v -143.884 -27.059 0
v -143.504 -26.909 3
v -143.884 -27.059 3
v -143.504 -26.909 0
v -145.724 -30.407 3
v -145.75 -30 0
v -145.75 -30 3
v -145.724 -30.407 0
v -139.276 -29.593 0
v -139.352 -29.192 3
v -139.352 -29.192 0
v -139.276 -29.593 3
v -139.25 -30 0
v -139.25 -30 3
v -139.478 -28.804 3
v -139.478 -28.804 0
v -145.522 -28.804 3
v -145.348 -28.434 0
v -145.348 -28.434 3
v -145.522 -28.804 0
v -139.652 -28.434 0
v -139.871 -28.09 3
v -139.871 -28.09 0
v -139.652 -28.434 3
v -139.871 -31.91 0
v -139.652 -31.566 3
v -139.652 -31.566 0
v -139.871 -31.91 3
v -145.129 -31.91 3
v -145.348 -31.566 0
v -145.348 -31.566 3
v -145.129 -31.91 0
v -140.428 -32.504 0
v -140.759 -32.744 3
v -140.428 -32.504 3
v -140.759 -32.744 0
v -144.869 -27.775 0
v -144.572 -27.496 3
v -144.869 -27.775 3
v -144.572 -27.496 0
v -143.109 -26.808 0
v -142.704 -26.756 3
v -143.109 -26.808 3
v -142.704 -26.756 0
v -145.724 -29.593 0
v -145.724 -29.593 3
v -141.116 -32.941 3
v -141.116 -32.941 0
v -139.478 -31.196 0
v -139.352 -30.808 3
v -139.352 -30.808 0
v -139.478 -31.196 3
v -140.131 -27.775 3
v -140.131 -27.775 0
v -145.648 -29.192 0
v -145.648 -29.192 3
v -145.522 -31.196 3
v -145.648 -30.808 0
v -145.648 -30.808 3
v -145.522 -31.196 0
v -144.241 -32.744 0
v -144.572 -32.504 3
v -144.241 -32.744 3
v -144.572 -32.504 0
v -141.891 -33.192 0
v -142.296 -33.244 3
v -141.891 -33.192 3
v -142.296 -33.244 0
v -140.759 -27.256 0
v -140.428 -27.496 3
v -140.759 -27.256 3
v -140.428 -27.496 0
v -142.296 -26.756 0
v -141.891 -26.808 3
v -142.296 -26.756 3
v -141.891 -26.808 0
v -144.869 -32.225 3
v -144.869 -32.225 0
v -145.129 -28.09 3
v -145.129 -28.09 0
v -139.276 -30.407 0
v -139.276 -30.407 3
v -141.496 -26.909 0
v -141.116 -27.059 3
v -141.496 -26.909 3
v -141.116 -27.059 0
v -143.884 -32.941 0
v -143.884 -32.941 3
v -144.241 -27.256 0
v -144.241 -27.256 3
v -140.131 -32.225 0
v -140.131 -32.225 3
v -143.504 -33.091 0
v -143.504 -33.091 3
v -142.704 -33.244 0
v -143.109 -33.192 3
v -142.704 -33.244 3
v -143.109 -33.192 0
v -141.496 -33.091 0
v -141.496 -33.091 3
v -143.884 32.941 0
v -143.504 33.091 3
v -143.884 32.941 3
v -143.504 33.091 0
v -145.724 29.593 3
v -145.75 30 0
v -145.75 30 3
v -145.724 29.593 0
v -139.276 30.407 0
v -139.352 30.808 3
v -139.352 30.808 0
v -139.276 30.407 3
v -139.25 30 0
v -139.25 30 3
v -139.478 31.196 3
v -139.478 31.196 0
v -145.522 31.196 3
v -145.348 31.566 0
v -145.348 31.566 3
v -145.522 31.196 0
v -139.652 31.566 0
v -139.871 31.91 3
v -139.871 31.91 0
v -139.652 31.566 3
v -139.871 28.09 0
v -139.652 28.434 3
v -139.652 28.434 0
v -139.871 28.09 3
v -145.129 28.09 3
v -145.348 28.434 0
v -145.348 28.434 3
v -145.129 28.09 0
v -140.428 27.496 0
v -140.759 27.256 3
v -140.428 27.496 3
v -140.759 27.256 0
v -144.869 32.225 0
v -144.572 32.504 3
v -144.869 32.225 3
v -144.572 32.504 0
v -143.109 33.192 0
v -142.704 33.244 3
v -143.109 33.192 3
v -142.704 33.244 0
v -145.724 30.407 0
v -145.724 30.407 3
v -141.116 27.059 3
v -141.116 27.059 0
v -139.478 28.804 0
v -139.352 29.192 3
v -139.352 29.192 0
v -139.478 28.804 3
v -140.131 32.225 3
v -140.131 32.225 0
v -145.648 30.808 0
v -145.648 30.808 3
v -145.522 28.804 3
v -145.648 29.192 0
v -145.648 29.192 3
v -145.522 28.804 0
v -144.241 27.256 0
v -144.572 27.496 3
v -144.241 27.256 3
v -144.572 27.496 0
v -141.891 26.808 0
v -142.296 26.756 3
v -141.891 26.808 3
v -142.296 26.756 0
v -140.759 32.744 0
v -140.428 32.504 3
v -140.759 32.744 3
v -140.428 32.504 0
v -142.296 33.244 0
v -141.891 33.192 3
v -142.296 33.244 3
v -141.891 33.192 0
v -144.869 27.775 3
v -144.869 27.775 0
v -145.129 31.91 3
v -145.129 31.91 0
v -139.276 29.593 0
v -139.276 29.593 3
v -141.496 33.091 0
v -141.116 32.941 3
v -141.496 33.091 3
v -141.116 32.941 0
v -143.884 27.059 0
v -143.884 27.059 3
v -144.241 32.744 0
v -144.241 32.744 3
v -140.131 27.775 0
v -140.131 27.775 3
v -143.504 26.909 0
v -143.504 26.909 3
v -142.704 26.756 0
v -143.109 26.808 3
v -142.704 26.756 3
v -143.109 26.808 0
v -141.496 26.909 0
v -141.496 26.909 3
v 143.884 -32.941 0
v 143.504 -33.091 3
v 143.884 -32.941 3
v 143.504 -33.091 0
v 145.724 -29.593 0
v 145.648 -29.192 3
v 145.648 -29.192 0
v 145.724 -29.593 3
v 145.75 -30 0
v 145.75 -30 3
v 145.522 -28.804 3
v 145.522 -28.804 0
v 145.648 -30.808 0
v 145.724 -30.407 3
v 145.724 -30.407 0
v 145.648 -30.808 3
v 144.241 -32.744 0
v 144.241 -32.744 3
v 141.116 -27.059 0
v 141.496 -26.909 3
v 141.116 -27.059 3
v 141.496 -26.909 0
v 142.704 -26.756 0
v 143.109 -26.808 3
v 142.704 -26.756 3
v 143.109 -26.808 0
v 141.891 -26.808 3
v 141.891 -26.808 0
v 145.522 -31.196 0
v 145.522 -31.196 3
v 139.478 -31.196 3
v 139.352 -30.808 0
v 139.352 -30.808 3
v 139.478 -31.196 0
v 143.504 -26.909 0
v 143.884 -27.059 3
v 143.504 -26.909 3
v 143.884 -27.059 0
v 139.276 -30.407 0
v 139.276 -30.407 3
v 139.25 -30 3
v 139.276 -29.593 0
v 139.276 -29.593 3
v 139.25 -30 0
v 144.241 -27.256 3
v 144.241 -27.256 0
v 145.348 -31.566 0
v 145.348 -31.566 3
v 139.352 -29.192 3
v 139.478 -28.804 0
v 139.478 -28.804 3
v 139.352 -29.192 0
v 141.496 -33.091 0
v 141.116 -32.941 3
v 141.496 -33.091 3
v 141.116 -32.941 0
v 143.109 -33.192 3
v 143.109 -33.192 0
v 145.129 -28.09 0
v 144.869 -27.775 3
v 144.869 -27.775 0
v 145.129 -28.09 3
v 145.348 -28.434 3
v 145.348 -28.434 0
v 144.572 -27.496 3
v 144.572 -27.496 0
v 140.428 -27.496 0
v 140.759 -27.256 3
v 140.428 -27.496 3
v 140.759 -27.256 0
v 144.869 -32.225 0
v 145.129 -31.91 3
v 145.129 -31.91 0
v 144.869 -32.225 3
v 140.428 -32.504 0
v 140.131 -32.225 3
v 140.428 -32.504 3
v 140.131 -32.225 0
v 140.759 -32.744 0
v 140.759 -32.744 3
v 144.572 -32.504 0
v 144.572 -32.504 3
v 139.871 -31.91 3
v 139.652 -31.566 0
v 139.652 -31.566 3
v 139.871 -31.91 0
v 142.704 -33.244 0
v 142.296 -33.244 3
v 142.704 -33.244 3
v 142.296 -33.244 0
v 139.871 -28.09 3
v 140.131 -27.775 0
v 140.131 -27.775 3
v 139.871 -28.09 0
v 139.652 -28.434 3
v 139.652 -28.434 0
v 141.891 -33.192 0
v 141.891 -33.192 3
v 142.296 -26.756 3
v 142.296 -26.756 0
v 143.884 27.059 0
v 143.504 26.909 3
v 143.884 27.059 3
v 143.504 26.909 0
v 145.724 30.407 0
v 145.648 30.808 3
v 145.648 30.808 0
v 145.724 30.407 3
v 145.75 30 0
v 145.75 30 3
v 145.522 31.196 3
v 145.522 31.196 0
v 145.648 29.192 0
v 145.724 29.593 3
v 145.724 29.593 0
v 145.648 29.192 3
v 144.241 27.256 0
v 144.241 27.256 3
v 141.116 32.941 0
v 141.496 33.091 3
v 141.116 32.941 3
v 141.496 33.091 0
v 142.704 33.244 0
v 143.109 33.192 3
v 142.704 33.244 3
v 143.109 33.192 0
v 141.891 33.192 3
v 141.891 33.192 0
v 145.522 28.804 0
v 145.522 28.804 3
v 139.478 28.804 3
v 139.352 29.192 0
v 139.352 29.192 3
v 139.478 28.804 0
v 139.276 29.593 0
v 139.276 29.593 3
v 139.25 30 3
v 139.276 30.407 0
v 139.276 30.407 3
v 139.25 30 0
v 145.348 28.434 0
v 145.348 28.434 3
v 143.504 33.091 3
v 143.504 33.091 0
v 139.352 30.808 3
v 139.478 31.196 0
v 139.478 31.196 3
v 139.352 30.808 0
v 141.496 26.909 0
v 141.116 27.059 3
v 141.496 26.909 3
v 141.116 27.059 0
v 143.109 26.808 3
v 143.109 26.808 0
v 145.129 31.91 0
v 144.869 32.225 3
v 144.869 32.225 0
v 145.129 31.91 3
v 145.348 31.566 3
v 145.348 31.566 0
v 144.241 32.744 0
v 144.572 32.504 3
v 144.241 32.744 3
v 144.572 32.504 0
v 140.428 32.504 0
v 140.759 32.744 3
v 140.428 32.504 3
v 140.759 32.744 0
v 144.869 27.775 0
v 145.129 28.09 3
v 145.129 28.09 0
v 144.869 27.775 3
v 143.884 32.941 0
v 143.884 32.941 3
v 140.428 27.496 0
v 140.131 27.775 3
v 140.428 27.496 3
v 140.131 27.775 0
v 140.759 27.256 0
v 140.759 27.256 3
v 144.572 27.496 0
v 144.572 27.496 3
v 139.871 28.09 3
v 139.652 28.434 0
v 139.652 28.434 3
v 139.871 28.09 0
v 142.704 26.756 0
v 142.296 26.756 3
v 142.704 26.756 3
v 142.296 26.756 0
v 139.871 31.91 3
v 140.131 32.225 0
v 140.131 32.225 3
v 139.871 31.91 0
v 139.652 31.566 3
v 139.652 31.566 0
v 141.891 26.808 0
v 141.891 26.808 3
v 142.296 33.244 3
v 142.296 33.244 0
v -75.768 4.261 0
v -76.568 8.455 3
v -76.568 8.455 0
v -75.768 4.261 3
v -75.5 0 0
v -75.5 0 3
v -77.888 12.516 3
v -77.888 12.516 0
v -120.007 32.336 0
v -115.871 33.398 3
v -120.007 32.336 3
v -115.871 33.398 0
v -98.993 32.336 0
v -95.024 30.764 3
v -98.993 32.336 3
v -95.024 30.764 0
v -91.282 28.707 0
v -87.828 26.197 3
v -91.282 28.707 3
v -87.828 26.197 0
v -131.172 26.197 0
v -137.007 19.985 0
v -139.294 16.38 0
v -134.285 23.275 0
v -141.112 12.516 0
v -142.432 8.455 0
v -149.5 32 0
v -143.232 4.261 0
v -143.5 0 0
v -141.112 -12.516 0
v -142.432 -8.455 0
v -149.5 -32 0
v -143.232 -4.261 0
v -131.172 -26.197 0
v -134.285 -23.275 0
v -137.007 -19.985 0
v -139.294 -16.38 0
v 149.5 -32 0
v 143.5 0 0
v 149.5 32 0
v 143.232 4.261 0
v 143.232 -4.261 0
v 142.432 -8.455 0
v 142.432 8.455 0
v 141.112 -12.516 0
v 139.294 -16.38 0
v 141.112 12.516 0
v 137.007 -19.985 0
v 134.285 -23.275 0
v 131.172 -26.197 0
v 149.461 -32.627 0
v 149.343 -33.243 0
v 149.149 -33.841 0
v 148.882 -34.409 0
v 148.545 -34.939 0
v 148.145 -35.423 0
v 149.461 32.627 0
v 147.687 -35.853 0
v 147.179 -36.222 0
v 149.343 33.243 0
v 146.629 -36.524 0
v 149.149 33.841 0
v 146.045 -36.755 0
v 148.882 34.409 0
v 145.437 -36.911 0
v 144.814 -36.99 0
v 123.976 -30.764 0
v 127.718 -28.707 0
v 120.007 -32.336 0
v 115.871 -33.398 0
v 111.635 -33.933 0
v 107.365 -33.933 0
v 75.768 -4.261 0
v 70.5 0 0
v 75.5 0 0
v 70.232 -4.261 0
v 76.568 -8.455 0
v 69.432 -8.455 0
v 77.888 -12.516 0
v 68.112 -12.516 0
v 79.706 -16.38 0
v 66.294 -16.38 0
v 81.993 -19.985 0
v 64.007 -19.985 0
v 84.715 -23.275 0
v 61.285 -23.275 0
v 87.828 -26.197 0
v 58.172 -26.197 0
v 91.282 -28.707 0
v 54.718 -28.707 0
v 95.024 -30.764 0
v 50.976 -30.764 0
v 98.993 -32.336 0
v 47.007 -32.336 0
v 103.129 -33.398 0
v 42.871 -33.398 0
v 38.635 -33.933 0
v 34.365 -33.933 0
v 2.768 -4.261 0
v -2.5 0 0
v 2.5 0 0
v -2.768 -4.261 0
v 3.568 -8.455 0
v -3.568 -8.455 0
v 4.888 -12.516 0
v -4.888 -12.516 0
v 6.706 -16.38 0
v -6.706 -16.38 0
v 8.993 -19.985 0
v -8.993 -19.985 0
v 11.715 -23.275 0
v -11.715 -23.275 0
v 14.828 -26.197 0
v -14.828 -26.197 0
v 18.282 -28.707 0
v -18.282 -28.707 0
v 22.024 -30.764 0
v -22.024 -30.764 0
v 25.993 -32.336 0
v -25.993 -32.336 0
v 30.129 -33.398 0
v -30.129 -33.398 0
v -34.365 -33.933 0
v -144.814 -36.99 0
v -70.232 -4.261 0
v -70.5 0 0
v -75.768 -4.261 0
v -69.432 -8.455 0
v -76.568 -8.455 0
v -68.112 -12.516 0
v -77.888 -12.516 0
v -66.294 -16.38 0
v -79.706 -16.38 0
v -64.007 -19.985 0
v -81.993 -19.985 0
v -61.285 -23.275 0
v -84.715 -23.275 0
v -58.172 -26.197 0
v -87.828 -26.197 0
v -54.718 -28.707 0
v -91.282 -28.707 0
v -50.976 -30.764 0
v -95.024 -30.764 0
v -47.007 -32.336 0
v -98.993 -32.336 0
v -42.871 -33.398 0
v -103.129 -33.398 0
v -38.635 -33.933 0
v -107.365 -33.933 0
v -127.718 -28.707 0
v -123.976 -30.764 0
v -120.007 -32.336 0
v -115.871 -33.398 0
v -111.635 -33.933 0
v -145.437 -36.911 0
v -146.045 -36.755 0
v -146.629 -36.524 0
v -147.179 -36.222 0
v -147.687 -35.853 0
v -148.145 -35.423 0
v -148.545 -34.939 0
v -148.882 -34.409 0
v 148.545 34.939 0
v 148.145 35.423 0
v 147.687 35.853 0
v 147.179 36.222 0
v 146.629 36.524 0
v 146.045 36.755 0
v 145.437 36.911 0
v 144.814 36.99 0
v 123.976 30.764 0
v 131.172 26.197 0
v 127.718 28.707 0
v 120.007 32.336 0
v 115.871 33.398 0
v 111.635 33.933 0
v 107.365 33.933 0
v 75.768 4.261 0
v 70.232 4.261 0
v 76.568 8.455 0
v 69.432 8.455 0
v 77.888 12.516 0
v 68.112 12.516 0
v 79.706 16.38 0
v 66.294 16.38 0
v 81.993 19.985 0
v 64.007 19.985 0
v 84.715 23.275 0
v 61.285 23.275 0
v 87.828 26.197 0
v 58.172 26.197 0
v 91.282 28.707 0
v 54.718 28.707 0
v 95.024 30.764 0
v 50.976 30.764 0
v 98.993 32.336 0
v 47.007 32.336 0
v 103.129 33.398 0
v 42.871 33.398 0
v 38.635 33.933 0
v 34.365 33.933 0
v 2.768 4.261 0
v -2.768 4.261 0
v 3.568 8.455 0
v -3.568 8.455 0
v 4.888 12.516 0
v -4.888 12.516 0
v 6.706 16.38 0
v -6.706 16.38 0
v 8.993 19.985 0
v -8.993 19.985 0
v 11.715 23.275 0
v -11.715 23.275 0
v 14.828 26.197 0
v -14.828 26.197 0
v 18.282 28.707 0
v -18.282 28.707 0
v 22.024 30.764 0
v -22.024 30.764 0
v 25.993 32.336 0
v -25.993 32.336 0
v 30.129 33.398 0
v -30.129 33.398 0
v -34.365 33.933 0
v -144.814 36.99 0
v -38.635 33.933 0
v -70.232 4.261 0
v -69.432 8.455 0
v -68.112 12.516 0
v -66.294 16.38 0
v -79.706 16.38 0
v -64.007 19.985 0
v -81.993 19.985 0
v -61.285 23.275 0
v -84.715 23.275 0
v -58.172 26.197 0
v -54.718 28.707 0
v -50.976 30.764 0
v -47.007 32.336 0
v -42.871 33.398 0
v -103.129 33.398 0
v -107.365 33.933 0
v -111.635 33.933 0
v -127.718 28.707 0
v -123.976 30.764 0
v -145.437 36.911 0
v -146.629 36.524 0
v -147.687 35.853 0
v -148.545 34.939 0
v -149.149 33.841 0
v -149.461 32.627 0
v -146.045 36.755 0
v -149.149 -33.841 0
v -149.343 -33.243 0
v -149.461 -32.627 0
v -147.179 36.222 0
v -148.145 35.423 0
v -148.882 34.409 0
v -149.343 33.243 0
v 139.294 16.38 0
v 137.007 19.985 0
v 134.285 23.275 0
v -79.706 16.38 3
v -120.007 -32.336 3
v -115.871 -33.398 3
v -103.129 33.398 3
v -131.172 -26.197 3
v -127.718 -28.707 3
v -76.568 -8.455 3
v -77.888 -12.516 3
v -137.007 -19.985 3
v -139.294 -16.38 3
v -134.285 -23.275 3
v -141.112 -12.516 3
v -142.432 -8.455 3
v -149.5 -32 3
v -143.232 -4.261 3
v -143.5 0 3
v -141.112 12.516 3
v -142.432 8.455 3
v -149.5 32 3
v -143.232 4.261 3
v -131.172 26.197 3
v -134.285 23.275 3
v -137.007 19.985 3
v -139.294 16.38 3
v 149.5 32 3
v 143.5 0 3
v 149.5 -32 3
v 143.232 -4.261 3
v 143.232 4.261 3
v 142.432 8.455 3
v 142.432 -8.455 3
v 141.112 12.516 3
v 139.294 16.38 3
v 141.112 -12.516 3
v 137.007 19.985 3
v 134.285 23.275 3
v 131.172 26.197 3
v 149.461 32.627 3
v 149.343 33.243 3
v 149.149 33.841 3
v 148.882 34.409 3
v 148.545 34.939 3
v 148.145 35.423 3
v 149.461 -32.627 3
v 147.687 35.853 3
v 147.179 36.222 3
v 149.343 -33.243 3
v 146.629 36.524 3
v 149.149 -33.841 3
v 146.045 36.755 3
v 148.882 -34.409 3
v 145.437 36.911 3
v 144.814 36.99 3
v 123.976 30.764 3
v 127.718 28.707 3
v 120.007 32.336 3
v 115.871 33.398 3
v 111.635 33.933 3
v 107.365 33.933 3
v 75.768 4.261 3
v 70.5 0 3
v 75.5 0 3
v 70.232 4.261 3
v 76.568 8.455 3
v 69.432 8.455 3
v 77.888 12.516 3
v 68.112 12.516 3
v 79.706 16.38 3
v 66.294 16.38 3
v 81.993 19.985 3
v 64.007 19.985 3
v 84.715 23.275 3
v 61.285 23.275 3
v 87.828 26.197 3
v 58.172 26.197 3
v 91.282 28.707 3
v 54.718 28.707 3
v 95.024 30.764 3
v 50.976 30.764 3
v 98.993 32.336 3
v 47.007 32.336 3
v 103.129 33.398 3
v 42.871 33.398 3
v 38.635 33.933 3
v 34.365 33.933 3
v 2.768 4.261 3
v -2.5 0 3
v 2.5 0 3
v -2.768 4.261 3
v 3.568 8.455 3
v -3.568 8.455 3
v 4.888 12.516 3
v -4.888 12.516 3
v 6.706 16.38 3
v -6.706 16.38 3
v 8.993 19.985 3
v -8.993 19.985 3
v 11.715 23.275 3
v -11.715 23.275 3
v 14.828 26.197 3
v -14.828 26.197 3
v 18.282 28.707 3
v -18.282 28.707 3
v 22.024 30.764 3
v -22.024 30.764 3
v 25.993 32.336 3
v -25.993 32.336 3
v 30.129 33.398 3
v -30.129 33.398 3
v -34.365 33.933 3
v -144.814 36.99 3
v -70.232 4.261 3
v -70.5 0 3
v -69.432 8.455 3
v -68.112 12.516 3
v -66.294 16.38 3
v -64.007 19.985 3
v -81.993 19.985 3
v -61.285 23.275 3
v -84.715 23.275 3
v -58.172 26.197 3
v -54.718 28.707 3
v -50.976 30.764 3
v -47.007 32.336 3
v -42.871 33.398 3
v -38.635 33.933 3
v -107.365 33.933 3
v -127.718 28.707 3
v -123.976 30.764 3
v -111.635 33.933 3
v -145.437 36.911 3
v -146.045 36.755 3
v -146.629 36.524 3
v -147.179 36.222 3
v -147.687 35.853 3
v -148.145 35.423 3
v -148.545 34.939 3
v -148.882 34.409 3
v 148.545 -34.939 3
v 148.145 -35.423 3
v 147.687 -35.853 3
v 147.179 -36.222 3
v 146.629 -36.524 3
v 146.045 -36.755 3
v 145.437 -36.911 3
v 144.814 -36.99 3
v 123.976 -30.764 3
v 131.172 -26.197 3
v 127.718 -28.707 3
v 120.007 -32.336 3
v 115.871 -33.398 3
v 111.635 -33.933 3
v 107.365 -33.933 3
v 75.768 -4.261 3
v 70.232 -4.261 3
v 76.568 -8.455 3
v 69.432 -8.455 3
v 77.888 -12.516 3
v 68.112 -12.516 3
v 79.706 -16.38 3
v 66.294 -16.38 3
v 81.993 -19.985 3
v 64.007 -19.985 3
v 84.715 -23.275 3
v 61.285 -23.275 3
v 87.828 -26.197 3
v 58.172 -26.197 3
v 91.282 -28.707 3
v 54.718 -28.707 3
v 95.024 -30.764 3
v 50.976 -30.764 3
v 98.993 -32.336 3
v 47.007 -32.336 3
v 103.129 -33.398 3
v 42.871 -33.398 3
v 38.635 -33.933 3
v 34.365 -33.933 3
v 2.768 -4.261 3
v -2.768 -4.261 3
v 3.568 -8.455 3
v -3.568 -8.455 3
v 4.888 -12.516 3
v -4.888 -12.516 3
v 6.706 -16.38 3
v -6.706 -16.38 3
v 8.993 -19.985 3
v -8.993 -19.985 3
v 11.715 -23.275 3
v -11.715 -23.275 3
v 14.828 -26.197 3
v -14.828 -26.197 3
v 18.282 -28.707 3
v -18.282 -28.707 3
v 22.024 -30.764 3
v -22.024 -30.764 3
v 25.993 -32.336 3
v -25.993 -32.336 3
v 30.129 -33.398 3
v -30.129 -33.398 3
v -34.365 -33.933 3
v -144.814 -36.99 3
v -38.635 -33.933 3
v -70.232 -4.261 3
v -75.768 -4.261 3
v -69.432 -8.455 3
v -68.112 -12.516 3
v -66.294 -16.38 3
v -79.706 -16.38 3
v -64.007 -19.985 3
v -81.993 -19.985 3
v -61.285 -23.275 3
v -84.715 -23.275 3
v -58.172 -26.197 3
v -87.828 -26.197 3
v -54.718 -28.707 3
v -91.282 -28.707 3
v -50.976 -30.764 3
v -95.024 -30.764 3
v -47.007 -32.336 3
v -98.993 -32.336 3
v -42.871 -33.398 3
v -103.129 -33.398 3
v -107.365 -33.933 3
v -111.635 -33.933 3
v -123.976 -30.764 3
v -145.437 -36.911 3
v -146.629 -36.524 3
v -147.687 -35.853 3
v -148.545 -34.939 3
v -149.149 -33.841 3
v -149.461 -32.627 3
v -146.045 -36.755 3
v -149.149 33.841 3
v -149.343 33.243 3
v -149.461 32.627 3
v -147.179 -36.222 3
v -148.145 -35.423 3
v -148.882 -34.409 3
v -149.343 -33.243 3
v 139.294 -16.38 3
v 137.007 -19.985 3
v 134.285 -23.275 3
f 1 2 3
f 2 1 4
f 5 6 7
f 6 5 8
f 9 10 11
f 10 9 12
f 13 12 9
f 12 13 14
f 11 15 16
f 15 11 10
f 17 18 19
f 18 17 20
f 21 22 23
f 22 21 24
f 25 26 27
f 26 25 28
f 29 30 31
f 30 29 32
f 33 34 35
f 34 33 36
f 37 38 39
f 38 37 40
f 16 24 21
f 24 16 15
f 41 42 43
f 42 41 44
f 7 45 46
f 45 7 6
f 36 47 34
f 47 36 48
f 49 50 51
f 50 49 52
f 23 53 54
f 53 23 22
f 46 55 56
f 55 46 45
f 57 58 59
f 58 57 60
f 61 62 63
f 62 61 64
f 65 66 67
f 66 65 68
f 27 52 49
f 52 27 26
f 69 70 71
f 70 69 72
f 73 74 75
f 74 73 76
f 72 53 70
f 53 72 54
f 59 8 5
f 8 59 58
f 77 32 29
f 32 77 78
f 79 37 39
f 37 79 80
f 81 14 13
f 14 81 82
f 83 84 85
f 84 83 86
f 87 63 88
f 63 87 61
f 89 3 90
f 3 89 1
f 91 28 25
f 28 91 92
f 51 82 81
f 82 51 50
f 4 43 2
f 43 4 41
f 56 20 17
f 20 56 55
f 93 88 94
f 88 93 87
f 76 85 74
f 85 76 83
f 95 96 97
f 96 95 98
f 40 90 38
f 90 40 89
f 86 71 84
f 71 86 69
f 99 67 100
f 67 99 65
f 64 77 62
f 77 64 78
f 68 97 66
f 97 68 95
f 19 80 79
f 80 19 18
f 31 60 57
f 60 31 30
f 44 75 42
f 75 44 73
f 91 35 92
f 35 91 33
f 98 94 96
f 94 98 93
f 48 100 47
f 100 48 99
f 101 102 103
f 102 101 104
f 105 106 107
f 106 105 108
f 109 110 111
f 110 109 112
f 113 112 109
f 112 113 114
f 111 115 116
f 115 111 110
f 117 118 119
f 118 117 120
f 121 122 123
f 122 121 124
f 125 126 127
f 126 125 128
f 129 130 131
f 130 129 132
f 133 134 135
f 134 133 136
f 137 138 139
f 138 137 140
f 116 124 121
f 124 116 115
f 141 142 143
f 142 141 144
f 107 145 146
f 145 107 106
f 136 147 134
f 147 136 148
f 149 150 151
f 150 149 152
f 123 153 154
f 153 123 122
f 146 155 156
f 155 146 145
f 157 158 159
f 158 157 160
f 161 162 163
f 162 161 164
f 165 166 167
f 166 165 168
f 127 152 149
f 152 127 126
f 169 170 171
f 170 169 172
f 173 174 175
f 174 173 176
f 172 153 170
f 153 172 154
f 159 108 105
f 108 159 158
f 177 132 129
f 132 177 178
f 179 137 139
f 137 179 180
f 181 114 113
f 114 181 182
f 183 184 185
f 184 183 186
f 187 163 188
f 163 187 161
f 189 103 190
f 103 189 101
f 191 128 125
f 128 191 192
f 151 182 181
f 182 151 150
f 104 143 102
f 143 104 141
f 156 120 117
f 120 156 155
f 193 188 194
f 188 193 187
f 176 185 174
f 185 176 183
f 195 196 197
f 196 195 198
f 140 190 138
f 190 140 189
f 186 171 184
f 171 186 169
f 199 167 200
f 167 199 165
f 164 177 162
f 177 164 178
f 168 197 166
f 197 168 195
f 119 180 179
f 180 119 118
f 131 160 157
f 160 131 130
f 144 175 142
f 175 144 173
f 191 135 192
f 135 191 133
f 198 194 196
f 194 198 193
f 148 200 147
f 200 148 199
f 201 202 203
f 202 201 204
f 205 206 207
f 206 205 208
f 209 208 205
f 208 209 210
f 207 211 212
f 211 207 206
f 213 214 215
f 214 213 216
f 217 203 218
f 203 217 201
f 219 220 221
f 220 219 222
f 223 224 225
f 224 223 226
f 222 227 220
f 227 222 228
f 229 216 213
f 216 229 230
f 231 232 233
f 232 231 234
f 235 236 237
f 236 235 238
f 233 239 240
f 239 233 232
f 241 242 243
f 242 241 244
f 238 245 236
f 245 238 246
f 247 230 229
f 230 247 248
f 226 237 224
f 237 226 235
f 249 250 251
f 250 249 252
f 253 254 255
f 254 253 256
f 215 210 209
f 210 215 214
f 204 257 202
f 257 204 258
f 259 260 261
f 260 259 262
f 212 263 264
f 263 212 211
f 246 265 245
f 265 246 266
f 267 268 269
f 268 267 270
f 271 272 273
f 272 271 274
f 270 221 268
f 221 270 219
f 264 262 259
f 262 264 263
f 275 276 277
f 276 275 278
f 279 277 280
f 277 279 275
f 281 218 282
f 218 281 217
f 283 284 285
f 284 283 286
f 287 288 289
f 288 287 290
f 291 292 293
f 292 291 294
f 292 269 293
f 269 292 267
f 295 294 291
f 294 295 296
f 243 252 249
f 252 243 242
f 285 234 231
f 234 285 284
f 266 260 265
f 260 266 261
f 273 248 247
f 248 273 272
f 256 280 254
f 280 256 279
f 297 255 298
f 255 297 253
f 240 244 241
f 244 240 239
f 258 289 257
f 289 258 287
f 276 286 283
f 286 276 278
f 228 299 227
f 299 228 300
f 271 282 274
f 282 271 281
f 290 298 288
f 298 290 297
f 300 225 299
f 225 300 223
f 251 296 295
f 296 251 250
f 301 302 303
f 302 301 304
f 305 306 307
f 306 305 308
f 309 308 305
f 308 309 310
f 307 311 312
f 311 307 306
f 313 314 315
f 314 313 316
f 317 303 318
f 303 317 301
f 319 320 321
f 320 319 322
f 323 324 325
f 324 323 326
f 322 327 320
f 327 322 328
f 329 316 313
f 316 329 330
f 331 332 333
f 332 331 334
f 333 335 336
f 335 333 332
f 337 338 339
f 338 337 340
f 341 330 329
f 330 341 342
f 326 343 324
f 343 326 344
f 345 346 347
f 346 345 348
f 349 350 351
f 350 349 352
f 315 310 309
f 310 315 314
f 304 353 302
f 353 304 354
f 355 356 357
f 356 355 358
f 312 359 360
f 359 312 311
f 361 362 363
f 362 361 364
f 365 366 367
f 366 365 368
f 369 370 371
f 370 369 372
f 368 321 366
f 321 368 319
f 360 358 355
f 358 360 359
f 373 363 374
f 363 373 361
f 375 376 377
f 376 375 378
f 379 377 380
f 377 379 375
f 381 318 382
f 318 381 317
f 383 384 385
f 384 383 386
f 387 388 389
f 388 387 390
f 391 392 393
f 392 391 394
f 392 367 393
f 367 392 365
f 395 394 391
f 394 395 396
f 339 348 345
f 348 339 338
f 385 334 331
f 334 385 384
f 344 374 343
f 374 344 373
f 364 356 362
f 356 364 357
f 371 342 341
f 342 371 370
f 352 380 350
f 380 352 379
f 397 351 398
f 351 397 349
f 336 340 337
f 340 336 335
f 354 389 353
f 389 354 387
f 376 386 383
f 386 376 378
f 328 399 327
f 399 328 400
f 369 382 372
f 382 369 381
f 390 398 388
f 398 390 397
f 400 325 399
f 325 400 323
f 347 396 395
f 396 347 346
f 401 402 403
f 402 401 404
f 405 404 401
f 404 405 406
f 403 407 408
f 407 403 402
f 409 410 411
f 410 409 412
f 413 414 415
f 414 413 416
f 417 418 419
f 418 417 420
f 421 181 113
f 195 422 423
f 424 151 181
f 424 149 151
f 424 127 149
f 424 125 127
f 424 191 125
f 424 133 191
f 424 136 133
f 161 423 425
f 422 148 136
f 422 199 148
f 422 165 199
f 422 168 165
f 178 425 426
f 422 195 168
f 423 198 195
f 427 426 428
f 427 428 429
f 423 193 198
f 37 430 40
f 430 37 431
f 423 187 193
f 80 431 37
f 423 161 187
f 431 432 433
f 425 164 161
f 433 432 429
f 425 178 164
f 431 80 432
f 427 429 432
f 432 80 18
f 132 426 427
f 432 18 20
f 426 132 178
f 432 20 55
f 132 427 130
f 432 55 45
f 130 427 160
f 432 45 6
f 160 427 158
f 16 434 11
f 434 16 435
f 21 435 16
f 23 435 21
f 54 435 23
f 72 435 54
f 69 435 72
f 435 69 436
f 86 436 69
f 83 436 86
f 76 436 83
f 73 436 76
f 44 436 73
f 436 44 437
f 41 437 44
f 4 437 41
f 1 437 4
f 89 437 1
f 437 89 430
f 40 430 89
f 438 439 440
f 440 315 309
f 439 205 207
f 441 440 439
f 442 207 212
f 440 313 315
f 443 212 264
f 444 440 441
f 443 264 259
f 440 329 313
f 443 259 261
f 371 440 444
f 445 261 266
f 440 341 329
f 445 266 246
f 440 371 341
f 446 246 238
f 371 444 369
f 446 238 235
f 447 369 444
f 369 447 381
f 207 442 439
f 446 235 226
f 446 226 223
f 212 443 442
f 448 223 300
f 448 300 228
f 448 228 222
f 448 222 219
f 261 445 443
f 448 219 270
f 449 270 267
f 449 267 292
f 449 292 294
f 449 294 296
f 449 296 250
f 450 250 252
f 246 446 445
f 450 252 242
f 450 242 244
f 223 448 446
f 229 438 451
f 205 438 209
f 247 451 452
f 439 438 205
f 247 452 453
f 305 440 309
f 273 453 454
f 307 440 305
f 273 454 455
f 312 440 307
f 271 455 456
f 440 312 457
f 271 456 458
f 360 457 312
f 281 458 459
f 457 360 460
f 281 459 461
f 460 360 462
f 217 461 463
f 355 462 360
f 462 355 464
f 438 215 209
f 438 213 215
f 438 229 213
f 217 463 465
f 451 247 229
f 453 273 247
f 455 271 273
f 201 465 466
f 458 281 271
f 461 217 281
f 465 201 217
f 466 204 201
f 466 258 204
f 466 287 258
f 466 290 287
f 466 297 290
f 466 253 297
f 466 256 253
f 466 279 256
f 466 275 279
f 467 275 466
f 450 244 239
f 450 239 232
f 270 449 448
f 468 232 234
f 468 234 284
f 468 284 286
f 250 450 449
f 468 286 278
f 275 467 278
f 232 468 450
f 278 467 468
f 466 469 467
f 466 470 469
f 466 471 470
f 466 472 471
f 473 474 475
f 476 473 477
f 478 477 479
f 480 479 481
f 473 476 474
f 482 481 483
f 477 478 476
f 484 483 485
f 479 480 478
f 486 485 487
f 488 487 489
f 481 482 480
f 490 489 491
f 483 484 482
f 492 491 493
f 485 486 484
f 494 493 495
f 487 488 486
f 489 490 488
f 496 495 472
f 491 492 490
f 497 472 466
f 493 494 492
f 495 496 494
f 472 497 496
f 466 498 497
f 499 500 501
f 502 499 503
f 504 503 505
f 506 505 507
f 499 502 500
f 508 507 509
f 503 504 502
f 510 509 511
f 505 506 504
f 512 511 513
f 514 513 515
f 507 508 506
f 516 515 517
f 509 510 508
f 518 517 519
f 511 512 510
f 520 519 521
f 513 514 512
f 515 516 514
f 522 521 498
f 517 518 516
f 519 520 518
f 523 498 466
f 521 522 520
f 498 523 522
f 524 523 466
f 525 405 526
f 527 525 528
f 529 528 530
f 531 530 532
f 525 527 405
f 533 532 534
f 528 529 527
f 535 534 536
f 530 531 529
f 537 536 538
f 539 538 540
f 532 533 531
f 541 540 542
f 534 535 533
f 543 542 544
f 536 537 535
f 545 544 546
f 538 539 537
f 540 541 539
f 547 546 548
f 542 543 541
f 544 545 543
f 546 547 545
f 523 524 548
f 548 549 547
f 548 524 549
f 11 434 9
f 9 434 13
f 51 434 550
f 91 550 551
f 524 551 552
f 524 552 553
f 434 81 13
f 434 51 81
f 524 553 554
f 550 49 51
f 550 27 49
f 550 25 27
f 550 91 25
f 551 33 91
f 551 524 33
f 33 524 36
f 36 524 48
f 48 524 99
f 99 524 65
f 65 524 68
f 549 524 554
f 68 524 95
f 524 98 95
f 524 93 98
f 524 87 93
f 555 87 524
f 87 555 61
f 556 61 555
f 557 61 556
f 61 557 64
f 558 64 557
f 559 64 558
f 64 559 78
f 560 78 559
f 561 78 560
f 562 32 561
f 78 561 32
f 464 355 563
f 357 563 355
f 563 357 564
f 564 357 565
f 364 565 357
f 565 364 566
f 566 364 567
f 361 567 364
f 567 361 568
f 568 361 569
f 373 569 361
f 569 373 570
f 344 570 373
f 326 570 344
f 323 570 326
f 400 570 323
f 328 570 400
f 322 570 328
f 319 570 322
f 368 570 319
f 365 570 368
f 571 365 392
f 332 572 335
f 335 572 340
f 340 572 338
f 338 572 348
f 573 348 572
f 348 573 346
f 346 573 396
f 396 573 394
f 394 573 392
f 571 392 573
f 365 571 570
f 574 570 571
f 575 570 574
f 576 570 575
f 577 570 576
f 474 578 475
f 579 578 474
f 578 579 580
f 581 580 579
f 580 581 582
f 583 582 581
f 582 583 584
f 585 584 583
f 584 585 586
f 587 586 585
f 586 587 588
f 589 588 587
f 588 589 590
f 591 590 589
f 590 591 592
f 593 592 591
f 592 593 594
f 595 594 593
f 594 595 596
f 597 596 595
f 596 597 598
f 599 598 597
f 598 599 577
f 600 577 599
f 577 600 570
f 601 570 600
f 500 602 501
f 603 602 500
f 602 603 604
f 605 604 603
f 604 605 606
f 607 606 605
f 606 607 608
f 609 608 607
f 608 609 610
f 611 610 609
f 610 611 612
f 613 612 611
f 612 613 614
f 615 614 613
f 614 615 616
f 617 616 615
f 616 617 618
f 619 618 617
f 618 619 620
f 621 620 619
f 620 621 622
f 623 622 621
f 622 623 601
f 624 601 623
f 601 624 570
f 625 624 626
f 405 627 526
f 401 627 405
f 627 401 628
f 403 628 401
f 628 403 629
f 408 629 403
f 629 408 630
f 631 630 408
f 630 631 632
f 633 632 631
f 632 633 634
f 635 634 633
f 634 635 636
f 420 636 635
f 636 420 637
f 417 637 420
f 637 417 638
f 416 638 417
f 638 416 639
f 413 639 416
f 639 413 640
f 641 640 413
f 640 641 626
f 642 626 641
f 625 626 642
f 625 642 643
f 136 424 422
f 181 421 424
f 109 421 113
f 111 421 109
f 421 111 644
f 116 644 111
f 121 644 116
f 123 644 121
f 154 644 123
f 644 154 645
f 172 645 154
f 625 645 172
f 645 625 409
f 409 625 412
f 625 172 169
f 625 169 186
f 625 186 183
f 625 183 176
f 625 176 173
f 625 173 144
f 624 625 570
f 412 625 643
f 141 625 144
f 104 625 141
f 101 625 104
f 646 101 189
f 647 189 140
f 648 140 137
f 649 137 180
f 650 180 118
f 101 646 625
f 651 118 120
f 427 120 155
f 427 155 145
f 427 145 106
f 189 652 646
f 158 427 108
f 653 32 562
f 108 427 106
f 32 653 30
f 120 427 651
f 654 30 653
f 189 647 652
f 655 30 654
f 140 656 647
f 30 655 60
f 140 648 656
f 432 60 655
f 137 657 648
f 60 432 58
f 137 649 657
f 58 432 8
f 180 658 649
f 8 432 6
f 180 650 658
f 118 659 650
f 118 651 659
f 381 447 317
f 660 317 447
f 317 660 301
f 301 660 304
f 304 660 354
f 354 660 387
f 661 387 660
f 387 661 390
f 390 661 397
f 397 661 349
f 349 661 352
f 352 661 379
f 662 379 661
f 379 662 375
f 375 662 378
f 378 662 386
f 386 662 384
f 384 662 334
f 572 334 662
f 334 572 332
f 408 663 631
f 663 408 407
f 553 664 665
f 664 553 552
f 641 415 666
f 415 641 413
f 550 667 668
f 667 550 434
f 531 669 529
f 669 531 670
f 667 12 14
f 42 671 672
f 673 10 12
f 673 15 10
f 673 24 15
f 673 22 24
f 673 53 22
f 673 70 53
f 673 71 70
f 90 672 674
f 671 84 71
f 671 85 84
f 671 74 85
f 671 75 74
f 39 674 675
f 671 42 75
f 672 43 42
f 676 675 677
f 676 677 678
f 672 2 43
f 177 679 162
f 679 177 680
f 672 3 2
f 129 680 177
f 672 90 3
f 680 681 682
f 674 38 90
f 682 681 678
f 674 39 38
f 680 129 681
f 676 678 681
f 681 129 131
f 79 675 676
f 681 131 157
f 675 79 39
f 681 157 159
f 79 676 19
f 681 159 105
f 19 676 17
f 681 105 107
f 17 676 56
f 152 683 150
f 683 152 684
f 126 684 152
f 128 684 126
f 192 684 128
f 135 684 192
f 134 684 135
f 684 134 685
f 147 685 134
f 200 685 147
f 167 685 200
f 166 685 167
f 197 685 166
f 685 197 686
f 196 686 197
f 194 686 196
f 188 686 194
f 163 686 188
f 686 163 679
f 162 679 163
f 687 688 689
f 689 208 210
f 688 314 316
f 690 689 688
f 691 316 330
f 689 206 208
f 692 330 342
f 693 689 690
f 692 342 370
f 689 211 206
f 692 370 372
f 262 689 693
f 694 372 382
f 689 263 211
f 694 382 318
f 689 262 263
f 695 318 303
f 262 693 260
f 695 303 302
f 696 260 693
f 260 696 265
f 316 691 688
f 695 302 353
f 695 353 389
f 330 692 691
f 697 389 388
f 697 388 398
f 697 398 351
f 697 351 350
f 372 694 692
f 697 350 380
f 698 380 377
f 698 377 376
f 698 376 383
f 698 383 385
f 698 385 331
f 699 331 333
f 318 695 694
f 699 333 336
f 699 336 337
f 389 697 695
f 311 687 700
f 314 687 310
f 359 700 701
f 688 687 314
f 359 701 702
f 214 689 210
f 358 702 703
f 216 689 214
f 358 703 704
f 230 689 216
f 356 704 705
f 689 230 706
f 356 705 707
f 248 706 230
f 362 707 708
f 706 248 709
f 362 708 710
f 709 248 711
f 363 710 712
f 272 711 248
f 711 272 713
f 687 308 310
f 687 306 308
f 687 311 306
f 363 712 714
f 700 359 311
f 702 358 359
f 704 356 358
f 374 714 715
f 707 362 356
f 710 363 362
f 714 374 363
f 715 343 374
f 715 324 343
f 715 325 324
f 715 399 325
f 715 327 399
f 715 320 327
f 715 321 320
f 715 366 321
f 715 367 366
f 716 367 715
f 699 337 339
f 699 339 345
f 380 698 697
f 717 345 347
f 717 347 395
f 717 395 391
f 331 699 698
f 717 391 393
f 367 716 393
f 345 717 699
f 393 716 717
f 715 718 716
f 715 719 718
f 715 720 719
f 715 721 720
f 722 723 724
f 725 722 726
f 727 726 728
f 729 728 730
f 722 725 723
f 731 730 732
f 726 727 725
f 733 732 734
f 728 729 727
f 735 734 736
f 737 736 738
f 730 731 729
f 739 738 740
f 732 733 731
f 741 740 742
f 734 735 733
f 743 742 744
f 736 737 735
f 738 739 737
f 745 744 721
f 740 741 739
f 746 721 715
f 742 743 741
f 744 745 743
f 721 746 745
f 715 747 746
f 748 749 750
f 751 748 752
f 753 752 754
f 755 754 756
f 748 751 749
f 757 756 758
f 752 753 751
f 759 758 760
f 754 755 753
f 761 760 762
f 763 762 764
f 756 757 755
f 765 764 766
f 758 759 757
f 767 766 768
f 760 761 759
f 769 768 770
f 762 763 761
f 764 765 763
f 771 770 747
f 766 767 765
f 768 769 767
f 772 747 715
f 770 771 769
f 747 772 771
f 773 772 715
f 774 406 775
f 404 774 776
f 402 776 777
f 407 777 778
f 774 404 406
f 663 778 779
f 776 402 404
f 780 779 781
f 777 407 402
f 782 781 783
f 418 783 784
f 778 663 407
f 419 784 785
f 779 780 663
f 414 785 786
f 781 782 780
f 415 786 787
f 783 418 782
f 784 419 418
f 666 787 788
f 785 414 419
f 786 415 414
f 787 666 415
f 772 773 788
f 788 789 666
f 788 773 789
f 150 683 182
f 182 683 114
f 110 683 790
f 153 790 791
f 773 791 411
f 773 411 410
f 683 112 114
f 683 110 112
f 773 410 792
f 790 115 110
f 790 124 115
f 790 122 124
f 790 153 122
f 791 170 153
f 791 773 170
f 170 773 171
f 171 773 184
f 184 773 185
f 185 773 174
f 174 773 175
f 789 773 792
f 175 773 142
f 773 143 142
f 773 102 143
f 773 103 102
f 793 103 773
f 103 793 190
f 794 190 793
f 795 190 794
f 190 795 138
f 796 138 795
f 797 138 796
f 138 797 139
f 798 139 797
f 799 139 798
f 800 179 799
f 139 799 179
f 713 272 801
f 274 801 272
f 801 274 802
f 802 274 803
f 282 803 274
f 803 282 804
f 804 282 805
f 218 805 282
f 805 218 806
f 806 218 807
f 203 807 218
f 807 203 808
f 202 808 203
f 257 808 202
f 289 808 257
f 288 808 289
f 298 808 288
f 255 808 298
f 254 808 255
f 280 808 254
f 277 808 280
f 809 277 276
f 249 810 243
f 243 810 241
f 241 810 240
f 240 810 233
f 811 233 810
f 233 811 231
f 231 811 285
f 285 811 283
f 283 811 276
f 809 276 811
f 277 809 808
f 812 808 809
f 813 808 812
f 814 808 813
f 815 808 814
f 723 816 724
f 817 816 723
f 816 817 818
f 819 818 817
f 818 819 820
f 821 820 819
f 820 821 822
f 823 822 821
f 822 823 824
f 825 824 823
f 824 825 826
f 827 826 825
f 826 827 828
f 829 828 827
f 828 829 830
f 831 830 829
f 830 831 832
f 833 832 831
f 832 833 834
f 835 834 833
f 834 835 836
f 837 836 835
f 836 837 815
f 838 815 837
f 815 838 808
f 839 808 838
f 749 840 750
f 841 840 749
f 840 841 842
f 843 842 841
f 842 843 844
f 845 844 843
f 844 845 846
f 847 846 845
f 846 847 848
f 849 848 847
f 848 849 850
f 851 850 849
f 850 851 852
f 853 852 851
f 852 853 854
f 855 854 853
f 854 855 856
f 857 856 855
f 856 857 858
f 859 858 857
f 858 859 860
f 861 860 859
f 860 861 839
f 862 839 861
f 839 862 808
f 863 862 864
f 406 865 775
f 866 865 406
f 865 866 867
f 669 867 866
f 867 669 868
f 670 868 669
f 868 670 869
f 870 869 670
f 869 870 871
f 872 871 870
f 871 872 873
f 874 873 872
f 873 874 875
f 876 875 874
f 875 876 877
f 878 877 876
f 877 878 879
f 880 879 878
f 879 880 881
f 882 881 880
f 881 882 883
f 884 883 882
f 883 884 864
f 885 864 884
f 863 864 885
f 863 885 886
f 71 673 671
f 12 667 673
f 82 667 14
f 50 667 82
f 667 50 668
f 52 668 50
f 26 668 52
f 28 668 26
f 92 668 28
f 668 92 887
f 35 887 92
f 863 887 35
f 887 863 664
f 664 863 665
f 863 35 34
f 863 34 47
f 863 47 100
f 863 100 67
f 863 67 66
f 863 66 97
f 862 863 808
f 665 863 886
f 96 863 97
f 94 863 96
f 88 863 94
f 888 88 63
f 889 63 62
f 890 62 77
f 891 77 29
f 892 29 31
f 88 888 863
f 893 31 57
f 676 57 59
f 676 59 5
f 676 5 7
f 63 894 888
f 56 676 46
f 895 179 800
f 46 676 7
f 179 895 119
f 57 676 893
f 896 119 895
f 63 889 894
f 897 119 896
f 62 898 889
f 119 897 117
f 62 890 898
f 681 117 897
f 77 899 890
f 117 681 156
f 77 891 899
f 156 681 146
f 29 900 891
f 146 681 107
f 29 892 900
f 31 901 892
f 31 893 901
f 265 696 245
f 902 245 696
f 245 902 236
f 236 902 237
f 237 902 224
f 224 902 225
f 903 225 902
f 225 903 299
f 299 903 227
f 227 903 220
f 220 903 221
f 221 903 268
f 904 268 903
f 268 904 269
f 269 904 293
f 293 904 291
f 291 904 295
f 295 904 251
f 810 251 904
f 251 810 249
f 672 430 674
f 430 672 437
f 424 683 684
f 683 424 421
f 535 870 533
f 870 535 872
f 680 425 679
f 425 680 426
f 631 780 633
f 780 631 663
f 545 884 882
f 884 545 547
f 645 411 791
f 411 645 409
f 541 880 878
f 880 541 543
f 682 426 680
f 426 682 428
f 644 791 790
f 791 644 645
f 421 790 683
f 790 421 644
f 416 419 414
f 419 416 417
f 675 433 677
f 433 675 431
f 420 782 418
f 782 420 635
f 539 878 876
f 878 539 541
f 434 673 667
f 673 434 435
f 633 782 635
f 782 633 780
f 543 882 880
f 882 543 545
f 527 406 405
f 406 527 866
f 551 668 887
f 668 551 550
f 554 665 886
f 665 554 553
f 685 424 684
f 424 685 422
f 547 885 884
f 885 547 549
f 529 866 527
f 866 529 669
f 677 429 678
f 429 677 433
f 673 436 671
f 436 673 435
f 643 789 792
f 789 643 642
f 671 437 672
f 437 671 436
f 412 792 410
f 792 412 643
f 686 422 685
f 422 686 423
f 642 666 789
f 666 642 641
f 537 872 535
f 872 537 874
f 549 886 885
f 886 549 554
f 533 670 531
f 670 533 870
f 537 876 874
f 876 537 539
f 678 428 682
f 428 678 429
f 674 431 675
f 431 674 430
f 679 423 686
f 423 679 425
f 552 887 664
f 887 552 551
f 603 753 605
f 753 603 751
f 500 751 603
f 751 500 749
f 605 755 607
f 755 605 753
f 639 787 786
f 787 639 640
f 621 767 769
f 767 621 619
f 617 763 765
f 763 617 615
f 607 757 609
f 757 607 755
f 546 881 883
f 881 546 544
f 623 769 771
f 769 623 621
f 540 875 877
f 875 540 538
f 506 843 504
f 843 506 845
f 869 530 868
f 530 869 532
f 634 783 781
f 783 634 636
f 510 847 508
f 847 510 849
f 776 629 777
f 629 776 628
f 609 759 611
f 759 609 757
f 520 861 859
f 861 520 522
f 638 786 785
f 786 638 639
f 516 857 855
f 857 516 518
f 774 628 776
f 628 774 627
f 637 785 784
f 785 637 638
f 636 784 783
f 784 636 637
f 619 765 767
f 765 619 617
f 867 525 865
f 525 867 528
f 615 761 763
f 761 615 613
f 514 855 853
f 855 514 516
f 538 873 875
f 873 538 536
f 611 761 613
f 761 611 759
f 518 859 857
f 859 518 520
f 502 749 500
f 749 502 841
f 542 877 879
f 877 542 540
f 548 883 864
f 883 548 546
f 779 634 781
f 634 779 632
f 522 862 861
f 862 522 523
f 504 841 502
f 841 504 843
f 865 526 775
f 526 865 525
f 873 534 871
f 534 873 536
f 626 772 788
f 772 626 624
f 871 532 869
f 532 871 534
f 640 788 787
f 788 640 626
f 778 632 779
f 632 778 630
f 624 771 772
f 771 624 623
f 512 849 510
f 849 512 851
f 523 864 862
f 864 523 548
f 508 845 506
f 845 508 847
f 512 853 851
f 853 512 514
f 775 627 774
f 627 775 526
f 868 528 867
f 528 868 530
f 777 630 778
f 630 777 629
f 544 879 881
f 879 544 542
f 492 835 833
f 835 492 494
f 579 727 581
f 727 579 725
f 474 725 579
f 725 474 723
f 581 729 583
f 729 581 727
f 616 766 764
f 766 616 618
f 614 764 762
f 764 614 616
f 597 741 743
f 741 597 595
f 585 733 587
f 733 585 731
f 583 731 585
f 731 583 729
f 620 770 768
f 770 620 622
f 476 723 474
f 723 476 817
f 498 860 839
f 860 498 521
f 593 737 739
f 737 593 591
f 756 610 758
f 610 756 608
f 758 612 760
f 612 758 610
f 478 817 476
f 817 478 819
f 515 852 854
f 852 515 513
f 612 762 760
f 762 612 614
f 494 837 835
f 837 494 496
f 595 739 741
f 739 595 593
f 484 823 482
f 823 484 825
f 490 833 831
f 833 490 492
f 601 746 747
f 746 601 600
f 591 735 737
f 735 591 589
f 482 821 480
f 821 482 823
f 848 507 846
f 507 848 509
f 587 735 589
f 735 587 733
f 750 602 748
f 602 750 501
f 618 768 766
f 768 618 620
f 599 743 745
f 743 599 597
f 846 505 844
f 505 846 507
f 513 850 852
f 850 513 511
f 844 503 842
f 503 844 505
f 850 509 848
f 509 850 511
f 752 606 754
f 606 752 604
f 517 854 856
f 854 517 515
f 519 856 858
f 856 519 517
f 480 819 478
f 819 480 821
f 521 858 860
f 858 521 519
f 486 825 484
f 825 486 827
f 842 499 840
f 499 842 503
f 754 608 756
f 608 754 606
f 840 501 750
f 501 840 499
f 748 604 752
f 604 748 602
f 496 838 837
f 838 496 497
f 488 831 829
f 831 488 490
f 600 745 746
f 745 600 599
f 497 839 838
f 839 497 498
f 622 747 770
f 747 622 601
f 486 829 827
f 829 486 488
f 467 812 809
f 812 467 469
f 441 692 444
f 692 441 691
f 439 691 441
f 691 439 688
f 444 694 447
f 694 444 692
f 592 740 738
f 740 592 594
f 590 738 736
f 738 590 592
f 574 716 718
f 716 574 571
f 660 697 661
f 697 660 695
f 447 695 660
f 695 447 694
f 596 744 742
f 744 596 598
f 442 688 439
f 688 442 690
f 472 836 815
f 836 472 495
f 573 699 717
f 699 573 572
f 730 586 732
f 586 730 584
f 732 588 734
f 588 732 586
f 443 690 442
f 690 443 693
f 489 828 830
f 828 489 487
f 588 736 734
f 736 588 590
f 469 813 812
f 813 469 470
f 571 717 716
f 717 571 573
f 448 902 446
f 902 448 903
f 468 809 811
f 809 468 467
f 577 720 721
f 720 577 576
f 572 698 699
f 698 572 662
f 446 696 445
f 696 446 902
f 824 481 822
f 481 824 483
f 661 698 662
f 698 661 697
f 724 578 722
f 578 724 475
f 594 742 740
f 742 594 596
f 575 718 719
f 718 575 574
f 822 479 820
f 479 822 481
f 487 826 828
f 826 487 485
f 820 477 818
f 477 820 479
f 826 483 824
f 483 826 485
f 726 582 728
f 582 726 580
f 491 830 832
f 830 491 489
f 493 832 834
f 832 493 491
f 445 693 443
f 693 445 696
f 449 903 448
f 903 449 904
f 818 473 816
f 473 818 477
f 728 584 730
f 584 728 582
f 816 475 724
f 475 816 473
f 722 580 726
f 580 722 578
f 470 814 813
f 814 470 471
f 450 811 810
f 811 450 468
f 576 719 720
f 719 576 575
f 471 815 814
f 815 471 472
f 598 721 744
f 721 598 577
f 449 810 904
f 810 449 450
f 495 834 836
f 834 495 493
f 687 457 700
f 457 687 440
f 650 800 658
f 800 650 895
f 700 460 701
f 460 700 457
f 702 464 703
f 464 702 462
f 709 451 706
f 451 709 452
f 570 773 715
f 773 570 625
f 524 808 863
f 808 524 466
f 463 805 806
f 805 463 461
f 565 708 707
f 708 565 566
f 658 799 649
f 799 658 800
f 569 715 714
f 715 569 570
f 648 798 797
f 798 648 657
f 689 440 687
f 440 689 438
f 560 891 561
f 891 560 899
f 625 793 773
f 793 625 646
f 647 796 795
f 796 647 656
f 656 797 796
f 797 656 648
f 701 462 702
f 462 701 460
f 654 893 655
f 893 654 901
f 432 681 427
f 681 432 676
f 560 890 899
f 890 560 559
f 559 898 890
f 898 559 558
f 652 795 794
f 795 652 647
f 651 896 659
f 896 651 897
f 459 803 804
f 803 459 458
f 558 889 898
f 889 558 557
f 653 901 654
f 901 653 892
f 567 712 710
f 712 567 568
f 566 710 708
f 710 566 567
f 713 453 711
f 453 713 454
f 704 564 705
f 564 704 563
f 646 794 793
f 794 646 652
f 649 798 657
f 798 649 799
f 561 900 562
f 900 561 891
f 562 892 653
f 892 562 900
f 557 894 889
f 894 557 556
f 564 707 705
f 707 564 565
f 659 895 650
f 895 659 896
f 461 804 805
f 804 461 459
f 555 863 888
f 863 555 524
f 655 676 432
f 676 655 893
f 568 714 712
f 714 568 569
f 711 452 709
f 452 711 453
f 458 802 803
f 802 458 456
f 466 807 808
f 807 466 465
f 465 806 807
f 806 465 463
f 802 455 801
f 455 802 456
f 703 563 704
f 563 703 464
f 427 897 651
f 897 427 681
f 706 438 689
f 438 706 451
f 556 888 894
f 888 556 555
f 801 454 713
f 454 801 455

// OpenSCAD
$fn = 50;


difference() {
	union() {
		hull() {
			translate(v = [-144.5000000000, 32.0000000000, 0]) {
				cylinder(h = 3, r = 5);
			}
			translate(v = [144.5000000000, 32.0000000000, 0]) {
				cylinder(h = 3, r = 5);
			}
			translate(v = [-144.5000000000, -32.0000000000, 0]) {
				cylinder(h = 3, r = 5);
			}
			translate(v = [144.5000000000, -32.0000000000, 0]) {
				cylinder(h = 3, r = 5);
			}
		}
	}
	union() {
		#translate(v = [-142.5000000000, -30.0000000000, -100.0000000000]) {
			cylinder(h = 200, r = 3.2500000000);
		}
		#translate(v = [-142.5000000000, 30.0000000000, -100.0000000000]) {
			cylinder(h = 200, r = 3.2500000000);
		}
		#translate(v = [142.5000000000, -30.0000000000, -100.0000000000]) {
			cylinder(h = 200, r = 3.2500000000);
		}
		#translate(v = [142.5000000000, 30.0000000000, -100.0000000000]) {
			cylinder(h = 200, r = 3.2500000000);
		}
		#translate(v = [-109.5000000000, 0, 0]) {
			cylinder(h = 3, r = 34.0000000000);
		}
		#translate(v = [-36.5000000000, 0, 0]) {
			cylinder(h = 3, r = 34.0000000000);
		}
		#translate(v = [36.5000000000, 0, 0]) {
			cylinder(h = 3, r = 34.0000000000);
		}
		#translate(v = [109.5000000000, 0, 0]) {
			cylinder(h = 3, r = 34.0000000000);
		}
	}
}
